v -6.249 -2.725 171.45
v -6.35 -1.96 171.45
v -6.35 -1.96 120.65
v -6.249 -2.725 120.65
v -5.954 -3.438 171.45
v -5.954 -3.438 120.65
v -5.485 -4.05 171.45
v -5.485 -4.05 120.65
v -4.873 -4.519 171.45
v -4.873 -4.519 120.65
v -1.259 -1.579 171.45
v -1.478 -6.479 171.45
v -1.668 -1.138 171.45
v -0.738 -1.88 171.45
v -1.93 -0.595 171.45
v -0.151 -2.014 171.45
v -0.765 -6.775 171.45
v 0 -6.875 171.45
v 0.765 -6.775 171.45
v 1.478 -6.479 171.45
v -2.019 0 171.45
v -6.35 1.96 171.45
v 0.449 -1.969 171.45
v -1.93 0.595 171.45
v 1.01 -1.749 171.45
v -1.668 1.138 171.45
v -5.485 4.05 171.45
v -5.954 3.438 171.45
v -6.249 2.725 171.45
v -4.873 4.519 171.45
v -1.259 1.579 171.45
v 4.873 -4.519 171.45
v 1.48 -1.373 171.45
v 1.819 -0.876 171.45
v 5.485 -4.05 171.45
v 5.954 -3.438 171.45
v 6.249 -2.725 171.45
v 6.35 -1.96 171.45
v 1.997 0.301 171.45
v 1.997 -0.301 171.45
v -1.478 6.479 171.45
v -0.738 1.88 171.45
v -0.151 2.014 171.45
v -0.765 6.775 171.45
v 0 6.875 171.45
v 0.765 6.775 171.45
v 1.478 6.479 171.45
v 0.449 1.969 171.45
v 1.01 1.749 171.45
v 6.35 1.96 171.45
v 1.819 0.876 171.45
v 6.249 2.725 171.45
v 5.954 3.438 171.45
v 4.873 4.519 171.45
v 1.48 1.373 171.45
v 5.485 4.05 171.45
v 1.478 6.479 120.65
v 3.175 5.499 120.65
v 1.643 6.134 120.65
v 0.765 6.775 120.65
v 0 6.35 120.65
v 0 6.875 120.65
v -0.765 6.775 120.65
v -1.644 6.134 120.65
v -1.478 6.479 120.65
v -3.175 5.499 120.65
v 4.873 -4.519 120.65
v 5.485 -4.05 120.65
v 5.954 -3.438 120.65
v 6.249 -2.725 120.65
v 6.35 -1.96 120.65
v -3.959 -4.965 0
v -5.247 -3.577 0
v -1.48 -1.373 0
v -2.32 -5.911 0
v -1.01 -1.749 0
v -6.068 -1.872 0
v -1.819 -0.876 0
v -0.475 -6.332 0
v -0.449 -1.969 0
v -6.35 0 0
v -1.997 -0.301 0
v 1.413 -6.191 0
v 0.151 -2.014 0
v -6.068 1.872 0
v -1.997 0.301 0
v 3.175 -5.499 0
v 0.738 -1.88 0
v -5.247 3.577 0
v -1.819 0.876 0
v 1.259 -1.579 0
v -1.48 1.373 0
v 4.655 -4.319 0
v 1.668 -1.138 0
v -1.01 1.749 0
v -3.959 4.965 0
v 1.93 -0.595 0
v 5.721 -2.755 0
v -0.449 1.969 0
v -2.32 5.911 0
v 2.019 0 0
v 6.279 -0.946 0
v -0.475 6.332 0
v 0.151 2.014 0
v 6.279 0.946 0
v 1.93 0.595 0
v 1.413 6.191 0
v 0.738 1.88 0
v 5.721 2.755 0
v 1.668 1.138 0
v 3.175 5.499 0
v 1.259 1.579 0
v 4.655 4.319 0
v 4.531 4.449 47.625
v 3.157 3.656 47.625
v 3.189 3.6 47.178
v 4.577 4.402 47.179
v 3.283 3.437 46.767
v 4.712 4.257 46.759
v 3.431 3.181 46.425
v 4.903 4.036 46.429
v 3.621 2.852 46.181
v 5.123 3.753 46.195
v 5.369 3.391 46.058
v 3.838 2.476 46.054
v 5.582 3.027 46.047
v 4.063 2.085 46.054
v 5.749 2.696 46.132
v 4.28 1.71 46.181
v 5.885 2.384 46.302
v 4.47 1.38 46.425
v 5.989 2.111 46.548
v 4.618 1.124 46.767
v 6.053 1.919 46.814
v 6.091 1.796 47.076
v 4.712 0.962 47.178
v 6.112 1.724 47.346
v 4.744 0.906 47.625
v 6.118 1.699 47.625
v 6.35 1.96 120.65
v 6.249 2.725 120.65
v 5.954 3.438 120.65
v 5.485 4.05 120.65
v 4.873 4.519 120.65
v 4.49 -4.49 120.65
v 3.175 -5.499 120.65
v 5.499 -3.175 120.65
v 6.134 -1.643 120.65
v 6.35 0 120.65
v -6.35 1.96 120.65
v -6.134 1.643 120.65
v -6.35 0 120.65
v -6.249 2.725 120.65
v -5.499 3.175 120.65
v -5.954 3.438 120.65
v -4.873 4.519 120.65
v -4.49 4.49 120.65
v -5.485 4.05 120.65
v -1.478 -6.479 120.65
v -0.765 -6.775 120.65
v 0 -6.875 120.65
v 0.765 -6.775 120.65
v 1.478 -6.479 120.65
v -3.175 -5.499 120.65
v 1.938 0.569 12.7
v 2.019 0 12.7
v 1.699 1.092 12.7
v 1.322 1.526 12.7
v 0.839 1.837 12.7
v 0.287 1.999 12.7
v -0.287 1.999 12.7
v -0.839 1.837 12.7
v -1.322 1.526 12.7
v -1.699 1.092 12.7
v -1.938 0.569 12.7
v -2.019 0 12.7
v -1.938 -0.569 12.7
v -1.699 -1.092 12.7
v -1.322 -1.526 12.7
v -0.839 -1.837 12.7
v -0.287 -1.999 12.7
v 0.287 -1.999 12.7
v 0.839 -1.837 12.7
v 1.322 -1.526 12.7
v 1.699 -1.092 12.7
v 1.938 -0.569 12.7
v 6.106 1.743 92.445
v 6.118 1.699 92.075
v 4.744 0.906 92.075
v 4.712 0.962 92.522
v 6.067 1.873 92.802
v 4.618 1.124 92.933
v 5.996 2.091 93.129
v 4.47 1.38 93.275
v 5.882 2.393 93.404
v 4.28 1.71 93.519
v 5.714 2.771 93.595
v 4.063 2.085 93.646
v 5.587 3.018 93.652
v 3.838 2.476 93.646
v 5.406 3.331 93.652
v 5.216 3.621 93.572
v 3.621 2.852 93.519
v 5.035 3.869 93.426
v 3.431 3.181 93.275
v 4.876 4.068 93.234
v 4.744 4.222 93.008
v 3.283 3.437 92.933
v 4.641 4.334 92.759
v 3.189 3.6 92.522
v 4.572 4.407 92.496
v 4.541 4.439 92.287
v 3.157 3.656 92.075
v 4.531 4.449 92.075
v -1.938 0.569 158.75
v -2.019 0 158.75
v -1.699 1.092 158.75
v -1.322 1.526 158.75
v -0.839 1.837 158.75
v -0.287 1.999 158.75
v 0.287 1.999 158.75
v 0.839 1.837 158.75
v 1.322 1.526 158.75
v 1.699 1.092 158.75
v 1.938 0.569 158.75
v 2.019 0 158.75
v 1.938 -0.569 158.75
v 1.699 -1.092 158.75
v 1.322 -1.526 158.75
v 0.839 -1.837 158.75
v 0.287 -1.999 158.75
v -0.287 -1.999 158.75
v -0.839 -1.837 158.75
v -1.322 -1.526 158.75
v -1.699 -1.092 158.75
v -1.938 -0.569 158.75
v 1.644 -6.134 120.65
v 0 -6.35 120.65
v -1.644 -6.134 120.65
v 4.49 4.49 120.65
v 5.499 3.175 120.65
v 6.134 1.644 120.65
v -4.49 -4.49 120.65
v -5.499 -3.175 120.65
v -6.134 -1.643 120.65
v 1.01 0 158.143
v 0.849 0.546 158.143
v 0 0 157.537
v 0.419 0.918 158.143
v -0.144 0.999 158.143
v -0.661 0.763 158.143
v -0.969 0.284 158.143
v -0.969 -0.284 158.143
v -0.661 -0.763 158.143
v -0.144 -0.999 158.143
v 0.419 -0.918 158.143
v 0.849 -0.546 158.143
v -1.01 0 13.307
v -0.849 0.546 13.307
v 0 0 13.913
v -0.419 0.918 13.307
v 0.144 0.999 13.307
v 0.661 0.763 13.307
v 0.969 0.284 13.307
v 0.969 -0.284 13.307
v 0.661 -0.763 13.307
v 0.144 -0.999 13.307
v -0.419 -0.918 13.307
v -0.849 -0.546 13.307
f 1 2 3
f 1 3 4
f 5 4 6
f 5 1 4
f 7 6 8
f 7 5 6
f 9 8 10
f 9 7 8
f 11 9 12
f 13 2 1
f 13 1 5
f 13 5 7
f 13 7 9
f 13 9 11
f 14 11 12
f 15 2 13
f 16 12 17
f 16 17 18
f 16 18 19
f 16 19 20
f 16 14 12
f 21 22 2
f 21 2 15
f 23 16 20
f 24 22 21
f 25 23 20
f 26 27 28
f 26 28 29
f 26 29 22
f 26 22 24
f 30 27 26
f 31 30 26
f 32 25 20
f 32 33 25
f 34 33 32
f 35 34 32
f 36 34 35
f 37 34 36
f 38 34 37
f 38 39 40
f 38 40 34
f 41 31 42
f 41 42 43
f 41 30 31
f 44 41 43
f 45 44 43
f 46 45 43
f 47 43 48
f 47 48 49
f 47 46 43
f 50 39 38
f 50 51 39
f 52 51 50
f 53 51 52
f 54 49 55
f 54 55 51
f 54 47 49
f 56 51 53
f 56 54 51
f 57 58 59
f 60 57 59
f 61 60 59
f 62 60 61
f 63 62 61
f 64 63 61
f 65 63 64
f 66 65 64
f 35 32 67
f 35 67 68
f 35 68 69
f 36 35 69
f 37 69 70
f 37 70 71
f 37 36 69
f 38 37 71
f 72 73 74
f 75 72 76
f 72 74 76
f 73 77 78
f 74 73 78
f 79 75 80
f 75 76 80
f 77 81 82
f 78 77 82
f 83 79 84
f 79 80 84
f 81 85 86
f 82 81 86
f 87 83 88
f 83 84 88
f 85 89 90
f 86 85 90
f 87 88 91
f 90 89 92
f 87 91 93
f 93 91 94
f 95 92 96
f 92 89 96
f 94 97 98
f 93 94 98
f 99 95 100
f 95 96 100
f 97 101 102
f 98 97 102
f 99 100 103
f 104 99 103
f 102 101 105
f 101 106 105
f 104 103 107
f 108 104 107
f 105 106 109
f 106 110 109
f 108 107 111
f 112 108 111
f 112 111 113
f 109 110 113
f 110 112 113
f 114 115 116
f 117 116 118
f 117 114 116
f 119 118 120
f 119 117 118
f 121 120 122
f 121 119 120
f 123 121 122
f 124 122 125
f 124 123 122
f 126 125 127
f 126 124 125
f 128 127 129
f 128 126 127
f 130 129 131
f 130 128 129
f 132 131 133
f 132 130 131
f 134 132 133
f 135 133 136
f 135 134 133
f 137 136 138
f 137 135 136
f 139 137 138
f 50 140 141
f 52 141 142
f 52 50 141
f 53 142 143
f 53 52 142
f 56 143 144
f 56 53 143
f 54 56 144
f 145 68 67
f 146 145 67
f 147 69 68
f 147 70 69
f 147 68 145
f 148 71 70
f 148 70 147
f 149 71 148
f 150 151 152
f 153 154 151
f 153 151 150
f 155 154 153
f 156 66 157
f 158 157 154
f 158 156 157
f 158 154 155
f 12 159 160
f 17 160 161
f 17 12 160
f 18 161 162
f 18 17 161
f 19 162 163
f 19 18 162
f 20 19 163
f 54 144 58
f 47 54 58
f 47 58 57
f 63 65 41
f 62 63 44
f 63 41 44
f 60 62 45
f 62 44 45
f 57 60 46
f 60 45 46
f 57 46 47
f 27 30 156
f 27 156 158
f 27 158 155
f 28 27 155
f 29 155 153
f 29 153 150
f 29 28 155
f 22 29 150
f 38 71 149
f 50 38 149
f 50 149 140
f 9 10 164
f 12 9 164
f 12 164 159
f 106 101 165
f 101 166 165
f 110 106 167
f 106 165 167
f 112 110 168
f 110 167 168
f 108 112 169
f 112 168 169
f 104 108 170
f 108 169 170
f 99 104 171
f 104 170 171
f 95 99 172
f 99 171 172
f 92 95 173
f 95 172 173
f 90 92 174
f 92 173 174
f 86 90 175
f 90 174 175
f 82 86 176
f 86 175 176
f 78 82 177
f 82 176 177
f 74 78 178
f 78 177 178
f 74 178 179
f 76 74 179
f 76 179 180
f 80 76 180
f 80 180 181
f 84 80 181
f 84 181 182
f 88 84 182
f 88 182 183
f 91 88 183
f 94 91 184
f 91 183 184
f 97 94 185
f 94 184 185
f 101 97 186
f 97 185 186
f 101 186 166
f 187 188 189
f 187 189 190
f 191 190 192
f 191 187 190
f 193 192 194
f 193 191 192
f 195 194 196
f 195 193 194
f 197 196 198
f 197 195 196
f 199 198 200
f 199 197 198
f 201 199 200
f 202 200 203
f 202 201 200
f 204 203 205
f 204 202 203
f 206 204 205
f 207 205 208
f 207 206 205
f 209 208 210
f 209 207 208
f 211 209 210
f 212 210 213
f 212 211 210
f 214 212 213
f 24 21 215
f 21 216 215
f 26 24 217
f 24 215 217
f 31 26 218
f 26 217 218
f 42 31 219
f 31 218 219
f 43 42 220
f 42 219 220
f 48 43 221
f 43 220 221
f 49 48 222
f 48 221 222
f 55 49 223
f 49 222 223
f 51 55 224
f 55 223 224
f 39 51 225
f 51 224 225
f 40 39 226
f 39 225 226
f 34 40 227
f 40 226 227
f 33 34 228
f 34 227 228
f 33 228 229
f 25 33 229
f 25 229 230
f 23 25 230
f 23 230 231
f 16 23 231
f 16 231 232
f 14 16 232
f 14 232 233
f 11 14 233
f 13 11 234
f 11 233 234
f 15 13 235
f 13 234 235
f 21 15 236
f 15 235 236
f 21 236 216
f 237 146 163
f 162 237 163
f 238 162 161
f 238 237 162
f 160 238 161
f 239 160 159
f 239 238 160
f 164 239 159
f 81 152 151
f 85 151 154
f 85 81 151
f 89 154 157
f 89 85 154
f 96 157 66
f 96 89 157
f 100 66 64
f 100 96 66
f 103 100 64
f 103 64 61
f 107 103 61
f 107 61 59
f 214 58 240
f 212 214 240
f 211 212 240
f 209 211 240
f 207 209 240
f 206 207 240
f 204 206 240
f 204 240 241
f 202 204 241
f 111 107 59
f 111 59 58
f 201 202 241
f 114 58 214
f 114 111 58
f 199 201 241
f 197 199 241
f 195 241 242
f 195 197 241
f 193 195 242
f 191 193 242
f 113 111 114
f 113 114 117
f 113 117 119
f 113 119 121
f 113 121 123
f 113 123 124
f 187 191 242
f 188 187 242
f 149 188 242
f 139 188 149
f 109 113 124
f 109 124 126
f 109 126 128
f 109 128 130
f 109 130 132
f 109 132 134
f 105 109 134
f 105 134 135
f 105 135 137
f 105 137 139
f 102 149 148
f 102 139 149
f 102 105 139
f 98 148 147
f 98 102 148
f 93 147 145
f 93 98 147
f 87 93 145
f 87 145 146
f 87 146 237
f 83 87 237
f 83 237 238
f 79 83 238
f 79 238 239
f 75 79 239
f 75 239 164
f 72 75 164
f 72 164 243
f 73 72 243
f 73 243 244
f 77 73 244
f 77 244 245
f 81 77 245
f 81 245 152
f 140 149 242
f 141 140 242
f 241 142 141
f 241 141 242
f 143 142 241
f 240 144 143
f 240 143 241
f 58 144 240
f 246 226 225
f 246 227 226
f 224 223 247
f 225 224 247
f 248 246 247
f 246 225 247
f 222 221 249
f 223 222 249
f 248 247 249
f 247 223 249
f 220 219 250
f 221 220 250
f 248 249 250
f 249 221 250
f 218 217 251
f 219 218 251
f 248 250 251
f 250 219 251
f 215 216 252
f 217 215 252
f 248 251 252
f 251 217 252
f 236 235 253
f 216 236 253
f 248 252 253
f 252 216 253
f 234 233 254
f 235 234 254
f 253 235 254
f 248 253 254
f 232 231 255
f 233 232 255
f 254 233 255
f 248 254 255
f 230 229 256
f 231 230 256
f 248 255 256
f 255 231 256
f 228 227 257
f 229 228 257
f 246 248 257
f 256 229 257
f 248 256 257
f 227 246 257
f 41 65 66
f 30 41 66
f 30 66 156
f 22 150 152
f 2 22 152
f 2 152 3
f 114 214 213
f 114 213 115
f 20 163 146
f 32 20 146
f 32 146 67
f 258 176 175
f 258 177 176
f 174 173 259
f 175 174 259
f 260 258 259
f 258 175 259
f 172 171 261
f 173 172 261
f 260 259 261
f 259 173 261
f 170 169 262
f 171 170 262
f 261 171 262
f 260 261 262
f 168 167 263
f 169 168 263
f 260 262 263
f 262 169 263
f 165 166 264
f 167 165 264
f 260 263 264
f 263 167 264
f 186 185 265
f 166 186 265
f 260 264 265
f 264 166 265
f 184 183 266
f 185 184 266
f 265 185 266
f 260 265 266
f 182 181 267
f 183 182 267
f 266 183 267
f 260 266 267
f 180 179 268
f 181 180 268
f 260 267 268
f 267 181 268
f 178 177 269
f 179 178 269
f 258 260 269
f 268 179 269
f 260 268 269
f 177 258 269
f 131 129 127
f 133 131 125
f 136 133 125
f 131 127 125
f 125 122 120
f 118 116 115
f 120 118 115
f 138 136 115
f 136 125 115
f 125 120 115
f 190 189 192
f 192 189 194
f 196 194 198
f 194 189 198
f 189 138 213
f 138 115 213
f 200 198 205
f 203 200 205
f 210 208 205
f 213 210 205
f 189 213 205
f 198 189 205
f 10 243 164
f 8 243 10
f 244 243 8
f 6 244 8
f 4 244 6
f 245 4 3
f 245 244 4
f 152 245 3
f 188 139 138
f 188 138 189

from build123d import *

# Parameters (mm, degrees)
BOSS_EXTRUDE1_DEPTH            = 171.45
FILLET1_R                      = 2.955
TAP_DRILL_FOR_10_32_TAP1_D     = 4.0386
TAP_DRILL_FOR_10_32_TAP1_DEPTH = 12.7
TAP_DRILL_FOR_10_32_TAP1_TIP   = 1.213317848
TAP_DRILL_FOR_10_32_TAP2_D     = 4.0386
TAP_DRILL_FOR_10_32_TAP2_DEPTH = 12.7
TAP_DRILL_FOR_10_32_TAP2_TIP   = 1.213317848
SKETCH12_OUTSIDE_W             = 49.194
SKETCH12_OUTSIDE_H             = 50.244
SKETCH12_OUTSIDE_R             = 6.35
CUT_EXTRUDE2_DEPTH             = 120.65
CUT_EXTRUDE3_DEPTH             = 1.9177


with BuildPart() as part:
    # Sketch3 → Boss-Extrude1 (new body)
    with BuildSketch(Plane.XY):
        Polygon((0, 7.332348419), (-6.35, 3.666174209), (-6.35, -3.666174209), (0, -7.332348419), (6.35, -3.666174209), (6.35, 3.666174209), align=None)
    extrude(amount=BOSS_EXTRUDE1_DEPTH)

    # Fillet1
    fillet1_edges = [part.edges().sort_by_distance(p)[0] for p in [
        (6.35, 3.666174209, 85.725),
        (6.35, -3.666174209, 85.725),
        (0, -7.332348419, 85.725),
        (-6.35, -3.666174209, 85.725),
        (-6.35, 3.666174209, 85.725),
        (0, 7.332348419, 85.725),
    ]]
    fillet(fillet1_edges, radius=FILLET1_R)

    # Tap Drill for #10-32 Tap1
    with Locations(Plane(origin=(0, 0, 0), x_dir=(-1, 0, 0), z_dir=(0, 0, -1))):
        with Locations((0, 0)):
            Hole(TAP_DRILL_FOR_10_32_TAP1_D / 2, depth=TAP_DRILL_FOR_10_32_TAP1_DEPTH)
            with Locations((0, 0, -(TAP_DRILL_FOR_10_32_TAP1_DEPTH + TAP_DRILL_FOR_10_32_TAP1_TIP / 2))):  # 118° drill point
                Cone(0, TAP_DRILL_FOR_10_32_TAP1_D / 2, TAP_DRILL_FOR_10_32_TAP1_TIP, mode=Mode.SUBTRACT)

    # Tap Drill for #10-32 Tap2
    with Locations(Plane.XY.offset(171.45)):
        with Locations((0, 0)):
            Hole(TAP_DRILL_FOR_10_32_TAP2_D / 2, depth=TAP_DRILL_FOR_10_32_TAP2_DEPTH)
            with Locations((0, 0, -(TAP_DRILL_FOR_10_32_TAP2_DEPTH + TAP_DRILL_FOR_10_32_TAP2_TIP / 2))):  # 118° drill point
                Cone(0, TAP_DRILL_FOR_10_32_TAP2_D / 2, TAP_DRILL_FOR_10_32_TAP2_TIP, mode=Mode.SUBTRACT)

    # Sketch12 outside → Cut-Extrude2 (cut)
    with BuildSketch(Plane(origin=(0, 0, 0), x_dir=(-1, 0, 0), z_dir=(0, 0, -1))):
        Rectangle(SKETCH12_OUTSIDE_W, SKETCH12_OUTSIDE_H)
        Circle(SKETCH12_OUTSIDE_R, mode=Mode.SUBTRACT)
    extrude(amount=-CUT_EXTRUDE2_DEPTH, mode=Mode.SUBTRACT)

    # Sketch13 → Cut-Extrude3 (cut)
    with BuildSketch(Plane(origin=(5.61125, 3.239656698, 0), x_dir=(0, 0, 1), z_dir=(-0.866025404, -0.5, 0))):
        with BuildLine():
            Line((92.075, 1.5875), (47.625, 1.5875))
            ThreePointArc((47.625, 1.5875), (46.0375, 0), (47.625, -1.5875))
            Line((47.625, -1.5875), (92.075, -1.5875))
            ThreePointArc((92.075, -1.5875), (93.6625, 0), (92.075, 1.5875))
        make_face()
    extrude(amount=CUT_EXTRUDE3_DEPTH, mode=Mode.SUBTRACT)


solid = part.part
